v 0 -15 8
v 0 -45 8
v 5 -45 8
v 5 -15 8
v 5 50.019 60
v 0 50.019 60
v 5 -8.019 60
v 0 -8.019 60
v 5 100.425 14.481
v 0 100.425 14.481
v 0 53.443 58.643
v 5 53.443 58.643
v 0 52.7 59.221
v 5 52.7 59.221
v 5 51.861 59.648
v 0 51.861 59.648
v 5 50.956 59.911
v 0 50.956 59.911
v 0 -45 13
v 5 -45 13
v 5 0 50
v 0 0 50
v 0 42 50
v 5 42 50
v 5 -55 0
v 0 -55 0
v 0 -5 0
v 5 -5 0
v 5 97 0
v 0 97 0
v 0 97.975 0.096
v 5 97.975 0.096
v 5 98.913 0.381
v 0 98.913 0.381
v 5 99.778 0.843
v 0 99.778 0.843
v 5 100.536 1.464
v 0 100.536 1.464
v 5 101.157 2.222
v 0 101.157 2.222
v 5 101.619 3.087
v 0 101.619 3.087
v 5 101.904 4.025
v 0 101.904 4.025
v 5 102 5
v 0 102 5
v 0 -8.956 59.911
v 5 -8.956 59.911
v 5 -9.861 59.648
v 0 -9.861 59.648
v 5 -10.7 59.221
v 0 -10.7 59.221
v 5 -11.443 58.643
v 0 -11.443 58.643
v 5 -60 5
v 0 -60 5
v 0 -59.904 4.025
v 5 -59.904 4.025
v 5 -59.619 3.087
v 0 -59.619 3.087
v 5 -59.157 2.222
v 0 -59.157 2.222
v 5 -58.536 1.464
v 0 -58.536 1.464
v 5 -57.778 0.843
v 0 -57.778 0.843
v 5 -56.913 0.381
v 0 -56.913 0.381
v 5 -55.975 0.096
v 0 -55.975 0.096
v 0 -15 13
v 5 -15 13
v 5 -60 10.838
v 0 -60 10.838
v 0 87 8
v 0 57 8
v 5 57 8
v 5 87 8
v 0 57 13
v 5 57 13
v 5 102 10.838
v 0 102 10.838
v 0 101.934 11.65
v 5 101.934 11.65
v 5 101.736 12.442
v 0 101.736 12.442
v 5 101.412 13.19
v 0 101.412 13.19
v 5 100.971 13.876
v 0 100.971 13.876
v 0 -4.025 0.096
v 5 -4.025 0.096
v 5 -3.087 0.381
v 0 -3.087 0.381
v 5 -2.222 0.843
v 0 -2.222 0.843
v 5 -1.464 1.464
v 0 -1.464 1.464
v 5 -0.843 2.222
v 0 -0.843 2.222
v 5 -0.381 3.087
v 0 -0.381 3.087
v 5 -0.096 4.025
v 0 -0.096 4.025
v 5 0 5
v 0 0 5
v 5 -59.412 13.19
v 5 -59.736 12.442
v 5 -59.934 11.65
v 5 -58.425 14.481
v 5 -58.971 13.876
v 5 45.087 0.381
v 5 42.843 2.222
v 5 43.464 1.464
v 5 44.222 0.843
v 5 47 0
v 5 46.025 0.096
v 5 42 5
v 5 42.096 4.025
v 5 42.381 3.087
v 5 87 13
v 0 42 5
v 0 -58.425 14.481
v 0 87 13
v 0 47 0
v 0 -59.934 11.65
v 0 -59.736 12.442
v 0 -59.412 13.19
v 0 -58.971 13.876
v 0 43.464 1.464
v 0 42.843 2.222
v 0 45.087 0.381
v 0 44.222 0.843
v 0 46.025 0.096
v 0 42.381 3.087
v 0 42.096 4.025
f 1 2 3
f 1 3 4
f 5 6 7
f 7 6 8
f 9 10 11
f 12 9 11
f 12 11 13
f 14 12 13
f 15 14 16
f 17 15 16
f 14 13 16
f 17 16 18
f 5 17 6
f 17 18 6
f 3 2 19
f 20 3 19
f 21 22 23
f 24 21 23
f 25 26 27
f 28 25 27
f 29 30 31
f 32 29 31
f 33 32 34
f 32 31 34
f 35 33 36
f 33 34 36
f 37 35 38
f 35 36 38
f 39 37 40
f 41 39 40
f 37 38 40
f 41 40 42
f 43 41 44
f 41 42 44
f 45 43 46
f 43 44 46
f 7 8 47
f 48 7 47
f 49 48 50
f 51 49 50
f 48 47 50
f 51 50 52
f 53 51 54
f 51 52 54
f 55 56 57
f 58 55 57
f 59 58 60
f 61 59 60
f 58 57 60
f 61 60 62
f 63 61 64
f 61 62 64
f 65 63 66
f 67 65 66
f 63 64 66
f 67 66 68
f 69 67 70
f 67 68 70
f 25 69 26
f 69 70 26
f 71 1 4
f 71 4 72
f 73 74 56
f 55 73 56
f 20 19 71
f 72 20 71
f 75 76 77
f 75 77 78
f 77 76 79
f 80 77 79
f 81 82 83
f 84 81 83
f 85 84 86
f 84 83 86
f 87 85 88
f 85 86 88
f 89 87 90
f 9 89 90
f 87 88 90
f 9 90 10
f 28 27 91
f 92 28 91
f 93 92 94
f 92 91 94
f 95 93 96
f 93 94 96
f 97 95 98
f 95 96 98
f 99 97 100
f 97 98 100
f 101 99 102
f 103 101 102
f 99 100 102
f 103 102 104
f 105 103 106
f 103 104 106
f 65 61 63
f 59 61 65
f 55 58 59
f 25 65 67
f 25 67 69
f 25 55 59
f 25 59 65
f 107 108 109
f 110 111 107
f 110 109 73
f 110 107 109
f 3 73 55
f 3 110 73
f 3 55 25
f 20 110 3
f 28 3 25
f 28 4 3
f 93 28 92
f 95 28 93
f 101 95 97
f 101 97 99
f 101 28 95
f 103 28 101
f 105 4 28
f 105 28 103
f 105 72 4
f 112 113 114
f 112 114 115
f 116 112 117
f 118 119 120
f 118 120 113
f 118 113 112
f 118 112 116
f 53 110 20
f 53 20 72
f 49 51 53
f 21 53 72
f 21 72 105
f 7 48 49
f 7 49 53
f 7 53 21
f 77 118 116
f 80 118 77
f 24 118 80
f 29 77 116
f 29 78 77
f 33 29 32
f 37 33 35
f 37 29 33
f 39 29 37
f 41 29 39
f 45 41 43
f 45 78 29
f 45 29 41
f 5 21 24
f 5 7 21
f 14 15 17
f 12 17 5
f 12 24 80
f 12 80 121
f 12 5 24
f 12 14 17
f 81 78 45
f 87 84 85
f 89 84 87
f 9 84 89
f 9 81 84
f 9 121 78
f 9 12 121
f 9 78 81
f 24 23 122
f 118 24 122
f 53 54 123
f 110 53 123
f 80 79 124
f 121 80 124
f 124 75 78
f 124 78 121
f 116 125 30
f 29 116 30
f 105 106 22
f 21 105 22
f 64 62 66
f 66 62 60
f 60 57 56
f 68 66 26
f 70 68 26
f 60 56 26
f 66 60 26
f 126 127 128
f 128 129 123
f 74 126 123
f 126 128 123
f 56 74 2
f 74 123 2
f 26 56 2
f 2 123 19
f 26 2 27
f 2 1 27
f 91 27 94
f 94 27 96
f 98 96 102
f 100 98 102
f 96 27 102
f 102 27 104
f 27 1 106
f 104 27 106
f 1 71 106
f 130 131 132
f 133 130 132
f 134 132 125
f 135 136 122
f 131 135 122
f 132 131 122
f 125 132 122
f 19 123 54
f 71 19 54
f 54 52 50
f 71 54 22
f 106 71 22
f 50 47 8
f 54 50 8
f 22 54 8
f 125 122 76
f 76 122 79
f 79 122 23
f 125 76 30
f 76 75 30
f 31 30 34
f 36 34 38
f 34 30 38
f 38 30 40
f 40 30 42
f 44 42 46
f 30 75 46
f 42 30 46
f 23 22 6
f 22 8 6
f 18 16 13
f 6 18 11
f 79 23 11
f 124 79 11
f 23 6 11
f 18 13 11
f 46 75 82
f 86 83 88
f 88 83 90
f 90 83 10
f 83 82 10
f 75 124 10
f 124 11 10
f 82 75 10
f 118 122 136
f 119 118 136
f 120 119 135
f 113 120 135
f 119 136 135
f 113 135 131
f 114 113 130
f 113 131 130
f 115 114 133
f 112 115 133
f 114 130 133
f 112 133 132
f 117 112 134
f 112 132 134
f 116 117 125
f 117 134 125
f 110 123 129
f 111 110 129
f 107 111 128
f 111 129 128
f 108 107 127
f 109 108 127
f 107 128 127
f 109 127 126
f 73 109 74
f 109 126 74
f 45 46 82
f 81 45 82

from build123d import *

# Parameters (mm, degrees)
F0_W     = 30
F0_H     = 5
F1_DEPTH = 5


with BuildPart() as f1:
    # F0 (on Right) → F1 (new body)
    with BuildSketch(Plane.YZ):
        with BuildLine():
            ThreePointArc((-5, 0), (-1.464466, 1.464466), (0, 5))
            Line((0, 5), (0, 50))
            Line((0, 50), (42, 50))
            Line((42, 50), (42, 5))
            ThreePointArc((42, 5), (43.464466, 1.464466), (47, 0))
            Line((47, 0), (97, 0))
            ThreePointArc((97, 0), (100.535534, 1.464466), (102, 5))
            Line((102, 5), (102, 10.837785))
            ThreePointArc((102, 10.837785), (101.589267, 12.822382), (100.42455, 14.480923))
            Line((100.42455, 14.480923), (53.44347, 58.643138))
            ThreePointArc((53.44347, 58.643138), (51.8607, 59.648424), (50.01892, 60))
            Line((50.01892, 60), (-8.01892, 60))
            ThreePointArc((-8.01892, 60), (-9.8607, 59.648424), (-11.44347, 58.643138))
            Line((-11.44347, 58.643138), (-58.42455, 14.480923))
            ThreePointArc((-58.42455, 14.480923), (-59.589267, 12.822382), (-60, 10.837785))
            Line((-60, 10.837785), (-60, 5))
            ThreePointArc((-60, 5), (-58.535534, 1.464466), (-55, 0))
            Line((-55, 0), (-5, 0))
        make_face()
        with Locations((-30, 10.5)):
            Rectangle(F0_W, F0_H, mode=Mode.SUBTRACT)
        with Locations((72, 10.5)):
            Rectangle(F0_W, F0_H, mode=Mode.SUBTRACT)
    extrude(amount=F1_DEPTH)


solid = f1.part
